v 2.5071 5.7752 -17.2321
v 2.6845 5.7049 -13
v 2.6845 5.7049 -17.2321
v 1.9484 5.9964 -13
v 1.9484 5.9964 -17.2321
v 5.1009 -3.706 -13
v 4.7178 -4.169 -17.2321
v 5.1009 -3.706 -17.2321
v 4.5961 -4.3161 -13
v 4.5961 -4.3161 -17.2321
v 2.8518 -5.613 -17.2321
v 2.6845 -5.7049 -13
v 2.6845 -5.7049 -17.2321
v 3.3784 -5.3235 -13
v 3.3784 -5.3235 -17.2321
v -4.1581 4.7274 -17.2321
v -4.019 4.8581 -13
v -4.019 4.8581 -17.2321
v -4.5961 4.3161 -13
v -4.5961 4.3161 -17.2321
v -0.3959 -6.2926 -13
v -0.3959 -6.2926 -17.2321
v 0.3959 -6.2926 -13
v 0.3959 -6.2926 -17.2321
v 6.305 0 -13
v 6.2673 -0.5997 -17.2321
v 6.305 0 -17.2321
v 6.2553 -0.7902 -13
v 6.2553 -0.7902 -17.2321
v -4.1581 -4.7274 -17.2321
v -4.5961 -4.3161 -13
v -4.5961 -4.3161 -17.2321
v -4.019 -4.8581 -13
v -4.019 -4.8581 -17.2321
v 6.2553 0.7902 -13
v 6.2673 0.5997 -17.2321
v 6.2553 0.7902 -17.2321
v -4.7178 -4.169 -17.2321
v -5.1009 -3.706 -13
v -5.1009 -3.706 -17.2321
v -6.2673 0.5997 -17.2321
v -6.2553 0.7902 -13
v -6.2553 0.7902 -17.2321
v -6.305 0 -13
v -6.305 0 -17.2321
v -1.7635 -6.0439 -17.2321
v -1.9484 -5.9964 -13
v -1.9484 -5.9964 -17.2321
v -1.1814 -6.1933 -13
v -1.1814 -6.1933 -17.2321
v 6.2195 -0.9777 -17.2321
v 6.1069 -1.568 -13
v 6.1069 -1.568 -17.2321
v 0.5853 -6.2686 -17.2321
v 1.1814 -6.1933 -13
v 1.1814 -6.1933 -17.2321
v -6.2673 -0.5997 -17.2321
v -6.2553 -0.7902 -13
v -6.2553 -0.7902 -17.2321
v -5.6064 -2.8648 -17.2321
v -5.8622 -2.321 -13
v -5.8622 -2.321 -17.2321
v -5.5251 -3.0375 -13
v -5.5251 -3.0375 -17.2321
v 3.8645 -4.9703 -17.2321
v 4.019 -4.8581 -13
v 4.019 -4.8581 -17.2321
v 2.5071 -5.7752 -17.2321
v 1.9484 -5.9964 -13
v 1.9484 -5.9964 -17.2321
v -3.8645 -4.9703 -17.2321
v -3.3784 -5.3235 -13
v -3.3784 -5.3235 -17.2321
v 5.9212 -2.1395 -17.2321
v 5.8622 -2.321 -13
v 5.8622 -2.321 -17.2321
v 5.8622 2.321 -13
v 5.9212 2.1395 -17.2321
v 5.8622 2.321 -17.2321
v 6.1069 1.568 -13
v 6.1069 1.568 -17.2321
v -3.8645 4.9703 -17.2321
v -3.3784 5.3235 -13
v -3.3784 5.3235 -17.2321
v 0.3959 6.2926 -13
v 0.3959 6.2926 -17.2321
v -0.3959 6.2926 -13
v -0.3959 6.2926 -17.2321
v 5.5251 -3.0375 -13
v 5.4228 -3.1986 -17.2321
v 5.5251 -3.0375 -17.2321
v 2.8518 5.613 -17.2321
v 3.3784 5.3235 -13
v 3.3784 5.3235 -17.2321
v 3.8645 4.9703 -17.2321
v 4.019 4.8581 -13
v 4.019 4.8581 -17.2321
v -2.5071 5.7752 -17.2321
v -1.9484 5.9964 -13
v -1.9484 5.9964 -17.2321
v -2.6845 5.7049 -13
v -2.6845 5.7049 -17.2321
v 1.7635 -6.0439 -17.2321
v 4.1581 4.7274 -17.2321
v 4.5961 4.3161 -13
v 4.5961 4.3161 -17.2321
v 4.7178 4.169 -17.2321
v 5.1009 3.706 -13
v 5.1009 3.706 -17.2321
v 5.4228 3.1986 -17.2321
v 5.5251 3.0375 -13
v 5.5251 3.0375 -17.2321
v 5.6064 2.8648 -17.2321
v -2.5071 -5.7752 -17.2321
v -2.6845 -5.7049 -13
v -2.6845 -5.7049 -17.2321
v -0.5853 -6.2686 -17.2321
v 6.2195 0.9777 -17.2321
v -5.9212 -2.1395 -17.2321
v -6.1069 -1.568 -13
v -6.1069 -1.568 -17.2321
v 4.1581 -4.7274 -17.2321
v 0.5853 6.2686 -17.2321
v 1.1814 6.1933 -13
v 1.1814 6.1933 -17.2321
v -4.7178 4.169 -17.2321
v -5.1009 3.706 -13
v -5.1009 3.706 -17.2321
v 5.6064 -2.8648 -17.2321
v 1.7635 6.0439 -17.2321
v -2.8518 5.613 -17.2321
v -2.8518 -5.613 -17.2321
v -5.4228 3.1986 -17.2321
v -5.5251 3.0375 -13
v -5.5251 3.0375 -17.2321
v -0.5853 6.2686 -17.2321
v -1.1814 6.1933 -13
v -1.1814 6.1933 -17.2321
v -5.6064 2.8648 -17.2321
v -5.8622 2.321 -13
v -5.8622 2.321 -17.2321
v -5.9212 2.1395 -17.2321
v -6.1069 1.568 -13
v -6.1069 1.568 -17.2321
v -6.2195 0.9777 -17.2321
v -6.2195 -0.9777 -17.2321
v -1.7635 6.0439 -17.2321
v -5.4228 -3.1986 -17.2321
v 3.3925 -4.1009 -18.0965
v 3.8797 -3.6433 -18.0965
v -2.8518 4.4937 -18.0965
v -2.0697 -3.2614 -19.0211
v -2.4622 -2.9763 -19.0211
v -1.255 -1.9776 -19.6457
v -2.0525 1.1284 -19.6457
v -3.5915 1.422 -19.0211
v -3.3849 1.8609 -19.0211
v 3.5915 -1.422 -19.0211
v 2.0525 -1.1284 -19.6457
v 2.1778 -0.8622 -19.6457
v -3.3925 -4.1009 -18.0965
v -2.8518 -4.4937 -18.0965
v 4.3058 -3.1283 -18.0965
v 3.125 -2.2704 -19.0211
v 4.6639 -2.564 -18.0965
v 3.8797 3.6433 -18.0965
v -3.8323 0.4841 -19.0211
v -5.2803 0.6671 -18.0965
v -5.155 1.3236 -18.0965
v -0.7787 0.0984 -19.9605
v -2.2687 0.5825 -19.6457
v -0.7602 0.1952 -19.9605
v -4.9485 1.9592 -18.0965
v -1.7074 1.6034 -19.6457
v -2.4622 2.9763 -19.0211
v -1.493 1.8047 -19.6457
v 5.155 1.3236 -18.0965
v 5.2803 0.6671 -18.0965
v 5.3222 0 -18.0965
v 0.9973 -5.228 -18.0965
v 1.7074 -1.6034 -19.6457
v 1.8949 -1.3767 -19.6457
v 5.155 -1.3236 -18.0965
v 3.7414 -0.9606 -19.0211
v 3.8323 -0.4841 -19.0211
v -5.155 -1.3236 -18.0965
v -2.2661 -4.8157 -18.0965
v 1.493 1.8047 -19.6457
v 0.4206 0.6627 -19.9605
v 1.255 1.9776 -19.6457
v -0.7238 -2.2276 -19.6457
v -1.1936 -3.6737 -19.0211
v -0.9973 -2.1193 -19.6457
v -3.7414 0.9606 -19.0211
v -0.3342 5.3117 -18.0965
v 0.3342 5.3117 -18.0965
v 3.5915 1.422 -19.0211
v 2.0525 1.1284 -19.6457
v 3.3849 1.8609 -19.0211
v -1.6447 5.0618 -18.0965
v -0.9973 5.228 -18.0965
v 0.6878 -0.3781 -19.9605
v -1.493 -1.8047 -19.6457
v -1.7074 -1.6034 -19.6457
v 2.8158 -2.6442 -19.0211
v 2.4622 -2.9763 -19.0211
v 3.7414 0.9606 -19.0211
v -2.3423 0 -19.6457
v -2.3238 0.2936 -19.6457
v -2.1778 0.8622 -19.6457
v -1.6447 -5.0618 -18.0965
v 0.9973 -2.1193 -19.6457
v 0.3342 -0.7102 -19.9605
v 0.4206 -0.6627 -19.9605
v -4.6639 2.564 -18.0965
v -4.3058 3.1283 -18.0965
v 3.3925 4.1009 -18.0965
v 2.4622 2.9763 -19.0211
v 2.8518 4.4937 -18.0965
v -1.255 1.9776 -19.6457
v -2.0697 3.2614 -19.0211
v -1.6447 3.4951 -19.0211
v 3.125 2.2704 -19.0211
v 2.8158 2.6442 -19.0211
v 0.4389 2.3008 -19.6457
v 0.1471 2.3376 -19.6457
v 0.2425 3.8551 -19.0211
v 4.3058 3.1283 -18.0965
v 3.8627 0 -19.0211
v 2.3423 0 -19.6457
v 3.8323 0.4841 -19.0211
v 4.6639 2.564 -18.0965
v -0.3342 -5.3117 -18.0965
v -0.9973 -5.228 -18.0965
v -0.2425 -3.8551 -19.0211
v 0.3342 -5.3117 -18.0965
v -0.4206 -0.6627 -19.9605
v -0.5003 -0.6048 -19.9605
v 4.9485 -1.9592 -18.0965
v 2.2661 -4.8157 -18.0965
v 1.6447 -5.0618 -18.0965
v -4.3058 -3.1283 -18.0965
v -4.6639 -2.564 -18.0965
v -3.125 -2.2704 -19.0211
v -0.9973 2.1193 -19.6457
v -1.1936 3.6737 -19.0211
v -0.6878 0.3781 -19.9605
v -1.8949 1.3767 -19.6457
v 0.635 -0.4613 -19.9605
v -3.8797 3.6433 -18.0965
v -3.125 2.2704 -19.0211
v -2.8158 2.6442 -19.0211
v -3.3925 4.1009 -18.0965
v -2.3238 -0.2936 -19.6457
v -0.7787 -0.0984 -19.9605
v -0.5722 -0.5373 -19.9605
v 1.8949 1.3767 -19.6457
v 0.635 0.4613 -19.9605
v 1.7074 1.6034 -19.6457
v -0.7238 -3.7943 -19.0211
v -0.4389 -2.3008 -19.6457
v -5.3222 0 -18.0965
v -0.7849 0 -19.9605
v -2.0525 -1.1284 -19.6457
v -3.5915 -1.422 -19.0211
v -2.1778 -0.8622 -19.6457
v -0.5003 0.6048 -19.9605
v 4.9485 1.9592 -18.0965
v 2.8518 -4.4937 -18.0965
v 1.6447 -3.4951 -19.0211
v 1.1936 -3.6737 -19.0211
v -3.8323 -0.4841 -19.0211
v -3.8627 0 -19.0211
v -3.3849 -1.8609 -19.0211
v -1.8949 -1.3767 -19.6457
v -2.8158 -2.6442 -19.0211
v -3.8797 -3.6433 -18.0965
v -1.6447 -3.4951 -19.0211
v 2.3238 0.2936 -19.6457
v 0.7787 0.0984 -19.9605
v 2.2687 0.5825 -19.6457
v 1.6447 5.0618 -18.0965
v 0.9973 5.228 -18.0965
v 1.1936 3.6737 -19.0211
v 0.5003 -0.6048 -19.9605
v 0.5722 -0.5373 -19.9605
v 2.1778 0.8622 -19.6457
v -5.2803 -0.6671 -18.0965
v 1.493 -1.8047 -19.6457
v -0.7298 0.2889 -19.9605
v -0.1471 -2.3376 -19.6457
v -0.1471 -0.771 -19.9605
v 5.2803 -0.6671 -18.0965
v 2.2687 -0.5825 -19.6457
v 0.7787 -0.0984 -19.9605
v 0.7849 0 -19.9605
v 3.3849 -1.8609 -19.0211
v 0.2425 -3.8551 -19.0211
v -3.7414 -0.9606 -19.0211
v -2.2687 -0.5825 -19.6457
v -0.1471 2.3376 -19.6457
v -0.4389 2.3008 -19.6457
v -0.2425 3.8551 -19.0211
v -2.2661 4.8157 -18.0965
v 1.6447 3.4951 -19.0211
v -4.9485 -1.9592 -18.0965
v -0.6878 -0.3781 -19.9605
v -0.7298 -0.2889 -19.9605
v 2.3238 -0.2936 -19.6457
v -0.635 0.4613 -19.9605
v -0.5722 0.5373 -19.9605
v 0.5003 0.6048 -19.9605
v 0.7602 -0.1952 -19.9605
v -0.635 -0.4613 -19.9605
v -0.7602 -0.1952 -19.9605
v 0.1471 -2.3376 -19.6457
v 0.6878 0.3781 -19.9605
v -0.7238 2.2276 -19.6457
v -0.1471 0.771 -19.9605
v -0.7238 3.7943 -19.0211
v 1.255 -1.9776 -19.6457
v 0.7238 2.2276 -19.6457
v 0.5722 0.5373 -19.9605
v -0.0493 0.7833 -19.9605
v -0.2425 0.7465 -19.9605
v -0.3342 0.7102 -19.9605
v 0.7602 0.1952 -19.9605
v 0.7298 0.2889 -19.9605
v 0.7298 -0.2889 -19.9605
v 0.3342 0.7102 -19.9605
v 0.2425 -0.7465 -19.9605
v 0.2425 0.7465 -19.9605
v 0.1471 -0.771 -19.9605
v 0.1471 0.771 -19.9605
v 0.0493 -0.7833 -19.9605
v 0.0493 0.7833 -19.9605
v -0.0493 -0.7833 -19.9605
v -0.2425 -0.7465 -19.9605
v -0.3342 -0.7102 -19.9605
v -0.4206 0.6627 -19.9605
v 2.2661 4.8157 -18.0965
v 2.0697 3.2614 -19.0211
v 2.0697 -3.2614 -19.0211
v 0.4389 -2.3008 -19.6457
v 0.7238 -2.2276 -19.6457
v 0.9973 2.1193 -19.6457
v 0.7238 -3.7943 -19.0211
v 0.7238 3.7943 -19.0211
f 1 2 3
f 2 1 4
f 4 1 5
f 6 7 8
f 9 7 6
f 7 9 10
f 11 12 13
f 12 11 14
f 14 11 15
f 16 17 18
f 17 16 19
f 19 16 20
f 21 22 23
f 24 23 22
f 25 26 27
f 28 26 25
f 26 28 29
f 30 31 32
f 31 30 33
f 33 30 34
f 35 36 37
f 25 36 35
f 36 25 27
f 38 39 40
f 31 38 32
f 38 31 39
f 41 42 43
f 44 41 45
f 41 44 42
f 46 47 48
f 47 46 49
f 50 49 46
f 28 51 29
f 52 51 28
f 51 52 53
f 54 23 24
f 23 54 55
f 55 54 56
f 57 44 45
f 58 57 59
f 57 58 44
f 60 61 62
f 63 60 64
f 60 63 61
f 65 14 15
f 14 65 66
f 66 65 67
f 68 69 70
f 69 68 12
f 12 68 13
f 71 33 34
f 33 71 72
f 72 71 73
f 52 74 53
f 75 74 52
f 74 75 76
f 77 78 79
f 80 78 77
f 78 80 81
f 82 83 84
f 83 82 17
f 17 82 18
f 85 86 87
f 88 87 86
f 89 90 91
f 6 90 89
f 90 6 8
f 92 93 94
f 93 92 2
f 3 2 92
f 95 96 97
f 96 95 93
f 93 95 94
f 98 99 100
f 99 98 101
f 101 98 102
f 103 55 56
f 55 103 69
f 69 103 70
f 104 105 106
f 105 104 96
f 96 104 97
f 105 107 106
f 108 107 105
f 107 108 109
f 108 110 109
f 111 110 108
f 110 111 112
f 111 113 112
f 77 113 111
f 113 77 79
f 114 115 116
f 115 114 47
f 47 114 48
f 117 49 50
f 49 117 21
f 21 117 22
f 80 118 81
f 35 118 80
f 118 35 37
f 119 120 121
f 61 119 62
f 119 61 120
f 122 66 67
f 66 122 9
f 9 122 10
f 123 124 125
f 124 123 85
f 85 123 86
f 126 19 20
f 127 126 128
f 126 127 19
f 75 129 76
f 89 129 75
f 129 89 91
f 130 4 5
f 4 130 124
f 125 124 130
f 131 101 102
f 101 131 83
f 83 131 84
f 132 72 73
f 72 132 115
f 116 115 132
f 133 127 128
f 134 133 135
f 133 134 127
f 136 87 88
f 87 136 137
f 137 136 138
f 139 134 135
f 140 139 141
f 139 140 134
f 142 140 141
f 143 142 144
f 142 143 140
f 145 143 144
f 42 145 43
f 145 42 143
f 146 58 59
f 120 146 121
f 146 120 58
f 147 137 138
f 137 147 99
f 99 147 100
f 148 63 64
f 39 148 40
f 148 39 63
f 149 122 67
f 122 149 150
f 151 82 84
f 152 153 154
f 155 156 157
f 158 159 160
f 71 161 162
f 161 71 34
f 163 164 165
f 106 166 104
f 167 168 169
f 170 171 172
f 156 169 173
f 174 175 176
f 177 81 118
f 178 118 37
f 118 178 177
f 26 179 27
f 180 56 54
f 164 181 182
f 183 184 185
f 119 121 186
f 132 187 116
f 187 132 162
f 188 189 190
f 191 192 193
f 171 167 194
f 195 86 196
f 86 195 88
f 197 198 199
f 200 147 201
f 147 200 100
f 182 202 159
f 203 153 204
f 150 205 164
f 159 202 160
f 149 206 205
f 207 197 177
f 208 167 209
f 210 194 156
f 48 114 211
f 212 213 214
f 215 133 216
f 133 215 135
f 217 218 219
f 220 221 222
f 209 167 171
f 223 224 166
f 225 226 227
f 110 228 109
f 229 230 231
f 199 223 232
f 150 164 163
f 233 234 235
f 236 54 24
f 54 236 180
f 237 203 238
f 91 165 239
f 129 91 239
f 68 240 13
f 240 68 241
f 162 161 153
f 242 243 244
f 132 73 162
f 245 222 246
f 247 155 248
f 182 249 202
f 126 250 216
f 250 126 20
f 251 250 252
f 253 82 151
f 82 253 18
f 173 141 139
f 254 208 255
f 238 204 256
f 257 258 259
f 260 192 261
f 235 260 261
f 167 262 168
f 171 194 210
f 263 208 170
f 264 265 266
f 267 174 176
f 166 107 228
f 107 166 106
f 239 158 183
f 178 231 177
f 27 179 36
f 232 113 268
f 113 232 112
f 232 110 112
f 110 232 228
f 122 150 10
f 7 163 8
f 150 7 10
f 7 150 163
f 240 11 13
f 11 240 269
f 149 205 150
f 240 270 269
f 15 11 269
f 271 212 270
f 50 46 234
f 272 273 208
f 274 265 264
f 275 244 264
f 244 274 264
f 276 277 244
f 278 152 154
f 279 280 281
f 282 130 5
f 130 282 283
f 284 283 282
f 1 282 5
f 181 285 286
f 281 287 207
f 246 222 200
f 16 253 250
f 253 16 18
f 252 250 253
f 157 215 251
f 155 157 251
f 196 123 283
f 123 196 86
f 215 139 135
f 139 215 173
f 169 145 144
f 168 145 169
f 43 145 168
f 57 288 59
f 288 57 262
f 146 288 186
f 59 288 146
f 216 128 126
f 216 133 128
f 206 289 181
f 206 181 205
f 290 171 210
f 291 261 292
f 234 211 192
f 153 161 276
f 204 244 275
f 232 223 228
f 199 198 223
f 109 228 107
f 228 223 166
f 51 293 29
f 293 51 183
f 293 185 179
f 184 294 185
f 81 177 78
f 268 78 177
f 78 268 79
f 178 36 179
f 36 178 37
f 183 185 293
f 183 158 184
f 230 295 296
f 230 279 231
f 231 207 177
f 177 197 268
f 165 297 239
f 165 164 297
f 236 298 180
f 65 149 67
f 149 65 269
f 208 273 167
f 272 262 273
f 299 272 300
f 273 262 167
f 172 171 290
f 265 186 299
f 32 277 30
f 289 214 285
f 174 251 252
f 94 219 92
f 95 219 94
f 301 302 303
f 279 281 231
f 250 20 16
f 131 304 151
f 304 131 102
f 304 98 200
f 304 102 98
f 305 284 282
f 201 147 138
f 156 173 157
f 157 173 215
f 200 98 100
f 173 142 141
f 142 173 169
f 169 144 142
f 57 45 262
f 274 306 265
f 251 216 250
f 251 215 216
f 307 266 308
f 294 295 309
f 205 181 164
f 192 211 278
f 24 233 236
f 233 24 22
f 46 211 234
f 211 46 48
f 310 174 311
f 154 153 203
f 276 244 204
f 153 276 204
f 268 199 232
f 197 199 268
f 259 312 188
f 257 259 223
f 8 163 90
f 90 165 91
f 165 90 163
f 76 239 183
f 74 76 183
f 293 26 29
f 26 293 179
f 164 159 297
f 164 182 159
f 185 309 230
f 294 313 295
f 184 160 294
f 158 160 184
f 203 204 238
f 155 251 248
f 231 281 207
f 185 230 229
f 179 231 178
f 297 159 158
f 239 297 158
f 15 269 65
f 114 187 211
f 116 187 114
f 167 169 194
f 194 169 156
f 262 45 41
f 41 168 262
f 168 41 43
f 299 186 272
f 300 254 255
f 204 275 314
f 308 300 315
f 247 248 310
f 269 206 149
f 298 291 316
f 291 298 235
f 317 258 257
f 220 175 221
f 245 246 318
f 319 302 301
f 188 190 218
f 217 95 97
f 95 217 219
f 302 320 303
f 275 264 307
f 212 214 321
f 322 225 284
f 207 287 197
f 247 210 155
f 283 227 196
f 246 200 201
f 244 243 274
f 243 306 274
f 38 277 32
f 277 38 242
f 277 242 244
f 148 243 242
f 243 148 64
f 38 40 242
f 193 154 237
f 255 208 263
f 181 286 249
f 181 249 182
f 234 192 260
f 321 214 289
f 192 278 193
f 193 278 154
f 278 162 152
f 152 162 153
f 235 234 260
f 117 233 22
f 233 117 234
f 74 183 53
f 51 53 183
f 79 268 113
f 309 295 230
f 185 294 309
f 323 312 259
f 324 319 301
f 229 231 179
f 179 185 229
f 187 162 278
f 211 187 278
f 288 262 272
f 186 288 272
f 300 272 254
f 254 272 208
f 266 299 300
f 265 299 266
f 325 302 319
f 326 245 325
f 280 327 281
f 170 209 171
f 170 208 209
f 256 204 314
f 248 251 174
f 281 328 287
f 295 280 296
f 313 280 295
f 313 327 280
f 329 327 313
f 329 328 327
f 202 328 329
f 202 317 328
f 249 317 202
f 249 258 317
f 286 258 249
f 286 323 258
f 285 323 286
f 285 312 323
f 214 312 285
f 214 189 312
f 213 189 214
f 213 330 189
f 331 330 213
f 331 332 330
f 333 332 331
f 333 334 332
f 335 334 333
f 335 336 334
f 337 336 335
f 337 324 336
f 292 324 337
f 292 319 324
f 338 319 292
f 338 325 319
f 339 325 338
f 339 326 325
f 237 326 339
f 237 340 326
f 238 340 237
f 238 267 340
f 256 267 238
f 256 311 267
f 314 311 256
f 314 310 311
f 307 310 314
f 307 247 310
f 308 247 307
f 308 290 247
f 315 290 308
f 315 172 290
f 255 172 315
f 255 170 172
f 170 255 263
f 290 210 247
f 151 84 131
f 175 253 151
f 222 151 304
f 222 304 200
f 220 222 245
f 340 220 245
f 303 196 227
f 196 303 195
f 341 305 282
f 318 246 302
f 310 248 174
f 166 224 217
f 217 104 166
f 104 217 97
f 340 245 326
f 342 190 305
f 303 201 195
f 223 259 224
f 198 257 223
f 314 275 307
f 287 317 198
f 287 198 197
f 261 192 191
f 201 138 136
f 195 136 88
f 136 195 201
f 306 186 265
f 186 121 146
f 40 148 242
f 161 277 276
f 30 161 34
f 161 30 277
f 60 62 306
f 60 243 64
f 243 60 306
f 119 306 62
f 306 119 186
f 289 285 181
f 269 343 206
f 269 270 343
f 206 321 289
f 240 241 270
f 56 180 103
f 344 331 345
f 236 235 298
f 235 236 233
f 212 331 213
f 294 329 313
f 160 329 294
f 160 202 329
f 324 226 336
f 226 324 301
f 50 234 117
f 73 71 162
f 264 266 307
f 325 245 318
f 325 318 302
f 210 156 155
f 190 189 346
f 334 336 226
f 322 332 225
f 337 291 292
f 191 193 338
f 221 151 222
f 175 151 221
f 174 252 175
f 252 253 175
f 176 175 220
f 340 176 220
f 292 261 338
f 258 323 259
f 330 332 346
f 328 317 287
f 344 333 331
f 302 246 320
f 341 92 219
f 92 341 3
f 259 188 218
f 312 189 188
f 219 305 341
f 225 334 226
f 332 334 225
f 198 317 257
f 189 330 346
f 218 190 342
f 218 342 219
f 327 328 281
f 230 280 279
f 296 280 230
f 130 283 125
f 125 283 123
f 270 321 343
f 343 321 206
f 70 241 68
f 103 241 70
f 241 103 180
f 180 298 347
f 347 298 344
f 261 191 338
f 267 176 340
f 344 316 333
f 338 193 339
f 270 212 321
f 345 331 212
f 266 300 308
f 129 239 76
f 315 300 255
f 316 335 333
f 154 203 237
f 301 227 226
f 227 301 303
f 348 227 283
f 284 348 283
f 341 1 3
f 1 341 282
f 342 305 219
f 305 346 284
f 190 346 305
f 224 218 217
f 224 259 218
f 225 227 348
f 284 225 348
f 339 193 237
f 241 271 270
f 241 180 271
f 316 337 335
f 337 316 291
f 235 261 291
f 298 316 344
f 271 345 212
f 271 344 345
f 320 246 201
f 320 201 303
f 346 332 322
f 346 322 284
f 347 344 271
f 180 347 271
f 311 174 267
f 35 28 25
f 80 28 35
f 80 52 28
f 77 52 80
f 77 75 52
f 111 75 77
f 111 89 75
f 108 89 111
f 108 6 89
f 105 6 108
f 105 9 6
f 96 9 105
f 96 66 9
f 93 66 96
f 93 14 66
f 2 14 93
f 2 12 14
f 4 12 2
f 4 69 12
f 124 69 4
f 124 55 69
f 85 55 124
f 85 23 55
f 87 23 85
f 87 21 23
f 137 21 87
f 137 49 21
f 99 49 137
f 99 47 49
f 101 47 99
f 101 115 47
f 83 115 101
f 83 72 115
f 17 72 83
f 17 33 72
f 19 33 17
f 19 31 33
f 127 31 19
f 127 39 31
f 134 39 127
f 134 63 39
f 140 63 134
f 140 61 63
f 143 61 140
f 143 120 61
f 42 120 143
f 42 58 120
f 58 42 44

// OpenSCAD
// file: ../gospel.scad
/**
 * GOSPEL: George's OpenSCAD Procedural Enhancement Library
 * @author glaza
 *
 * Index:
 *      Translation: x, y, z, xy, xz, yz, xyz (displacement, variation)
 *      Scaling:     sx, sy, sz, sxy, sxz, syz, s (factor, variation)
 *      Rotation:    rx, ry, rz (angle, variation)
 *      Duplication: dx, dy, dz ()
 */

/**
 * Translates the children in the X,Y,Z direction
 * @param d Displacement in X,Y,Z direction
 * @param variation The random variation + or - added to the displacement * 
 *  x      Translate X
 *  y      Translate Y
 *  z      Translate Z
 *  xy     Translate equaly in X and Y
 *  xz     Translate equaly in X and Z
 *  yz     Translate equaly in Y and Z
 *  xyz    Translate equaly in X, Y and Z
 */
module x(dx, variation=0) 
{   
    vx = rands(-variation,variation,1)[0];
    translate([dx+vx,0,0])
    children();
}
module y(dy, variation=0) 
{   
    vy = rands(-variation,variation,1)[0];
    translate([0,dy+vy,0])
    children();
} 
module z(dz, variation=0) 
{   
    vz = rands(-variation,variation,1)[0];
    translate([0,0,dz+vz])
    children();
}
module xy(d, variation=0) 
{   
    x(d, variation)
    y(d, variation)
    children();
}
module yz(d, variation=0) 
{   
    z(d, variation)
    y(d, variation)
    children();
}
module xz(d, variation=0) 
{   
    x(d, variation)
    z(d, variation)
    children();
}
module xyz(d, variation=0) 
{   
    xy(d, variation)
    z(d, variation)
    children();
}

/**
 * Rotates the children around the X axis
 * @param angle Degrees to rotate around the X axis
 * @param variation The random variation + or - added
 *  rx     Rotate around X
 *  ry     Rotate around Y
 *  rz     Rotate around Z
 */
module rx(angle, variation=0) 
{   
    v = rands(-variation,variation,1)[0];
    rotate([angle+v,0,0])
    children();
}
module ry(angle, variation=0) 
{   
    v = rands(-variation,variation,1)[0];
    rotate([0,angle+v,0,0])
    children();
}
module rz(angle, variation=0) 
{   
    v = rands(-variation,variation,1)[0];
    rotate([0,0,angle+v])
    children();
}

/**
 * Duplicates the children across the different planes.
 *      dx: YZ plane, dy: XZ plane, dz: XY plane
 */
module dx() 
{
    mirror([1,0,0])
    children();

    children();
}
module dy() 
{
    mirror([0,1,0])
    children();

    children();
}
module dz() 
{
    mirror([0,0,1])
    children();

    children();
}

/**
 * Mirrors across diferent planes.
 *      mx: YZ plane, my: XZ plane, mz: XY plane
 */
module mx() 
{
    mirror([1,0,0])
    children();
}
module my() 
{
    mirror([0,1,0])
    children();
}
module mz() 
{
    mirror([0,0,1])
    children();
}

/**
 * Scales in different directions
 *      mx: YZ plane, my: XZ plane, mz: XY plane
 */
module sx(factor, variation=0) 
{   
    v = rands(-variation,variation,1)[0];
    scale([factor+v,1,1])
    children();
}
module sy(factor, variation=0) 
{   
    v = rands(-variation,variation,1)[0];
    scale([1,factor+v,1])
    children();
} 
module sz(factor, variation=0) 
{   
    v = rands(-variation,variation,1)[0];
    scale([1,1,factor+v])
    children();
}
module sxy(factor, variation=0) 
{   
    sx(factor, variation)
    sy(factor, variation)
    children();
}
module syz(factor, variation=0) 
{   
    sz(factor, variation)
    sy(factor, variation)
    children();
}
module sxz(factor, variation=0) 
{   
    sx(factor, variation)
    sz(factor, variation)
    children();
}
module s(factor, variation=0) 
{   
    sxy(factor, variation)
    sz(factor, variation)
    children();
}

/**
 * Shortcuts
 */
module diff() //does not work
{
    difference()
    {
        children();
    }
}


/**
 * Colours
 */
module red()
{
    color("Red")
    children();
}
module blue()
{
    color("RoyalBlue")
    children();
}
module black()
{
    color("Black")
    children();
}
module white()
{
    color("White")
    children();
}
// main file
include<../gospel.scad>;

$fn=50;

insert();

module knob()
{
    difference()
    {
        sxy(25/40)
        sphere(r=20);
        
        cylinder(d=7, h=100, center=true);
        rx(180)
        cylinder(d=13, h=100);
     
        z(25+15)
        cube([50,50,50], center=true);
    }
}

module insert()
{
    difference()
    {
        sxy(25/40)
        sphere(r=20);
        
        rx(180)
        difference()
        {
            cylinder(d=40, h=100);
            cylinder(d=13*.97, h=100);
        }
        z(12)
        cube([50,50,50], center=true);
    }
}
